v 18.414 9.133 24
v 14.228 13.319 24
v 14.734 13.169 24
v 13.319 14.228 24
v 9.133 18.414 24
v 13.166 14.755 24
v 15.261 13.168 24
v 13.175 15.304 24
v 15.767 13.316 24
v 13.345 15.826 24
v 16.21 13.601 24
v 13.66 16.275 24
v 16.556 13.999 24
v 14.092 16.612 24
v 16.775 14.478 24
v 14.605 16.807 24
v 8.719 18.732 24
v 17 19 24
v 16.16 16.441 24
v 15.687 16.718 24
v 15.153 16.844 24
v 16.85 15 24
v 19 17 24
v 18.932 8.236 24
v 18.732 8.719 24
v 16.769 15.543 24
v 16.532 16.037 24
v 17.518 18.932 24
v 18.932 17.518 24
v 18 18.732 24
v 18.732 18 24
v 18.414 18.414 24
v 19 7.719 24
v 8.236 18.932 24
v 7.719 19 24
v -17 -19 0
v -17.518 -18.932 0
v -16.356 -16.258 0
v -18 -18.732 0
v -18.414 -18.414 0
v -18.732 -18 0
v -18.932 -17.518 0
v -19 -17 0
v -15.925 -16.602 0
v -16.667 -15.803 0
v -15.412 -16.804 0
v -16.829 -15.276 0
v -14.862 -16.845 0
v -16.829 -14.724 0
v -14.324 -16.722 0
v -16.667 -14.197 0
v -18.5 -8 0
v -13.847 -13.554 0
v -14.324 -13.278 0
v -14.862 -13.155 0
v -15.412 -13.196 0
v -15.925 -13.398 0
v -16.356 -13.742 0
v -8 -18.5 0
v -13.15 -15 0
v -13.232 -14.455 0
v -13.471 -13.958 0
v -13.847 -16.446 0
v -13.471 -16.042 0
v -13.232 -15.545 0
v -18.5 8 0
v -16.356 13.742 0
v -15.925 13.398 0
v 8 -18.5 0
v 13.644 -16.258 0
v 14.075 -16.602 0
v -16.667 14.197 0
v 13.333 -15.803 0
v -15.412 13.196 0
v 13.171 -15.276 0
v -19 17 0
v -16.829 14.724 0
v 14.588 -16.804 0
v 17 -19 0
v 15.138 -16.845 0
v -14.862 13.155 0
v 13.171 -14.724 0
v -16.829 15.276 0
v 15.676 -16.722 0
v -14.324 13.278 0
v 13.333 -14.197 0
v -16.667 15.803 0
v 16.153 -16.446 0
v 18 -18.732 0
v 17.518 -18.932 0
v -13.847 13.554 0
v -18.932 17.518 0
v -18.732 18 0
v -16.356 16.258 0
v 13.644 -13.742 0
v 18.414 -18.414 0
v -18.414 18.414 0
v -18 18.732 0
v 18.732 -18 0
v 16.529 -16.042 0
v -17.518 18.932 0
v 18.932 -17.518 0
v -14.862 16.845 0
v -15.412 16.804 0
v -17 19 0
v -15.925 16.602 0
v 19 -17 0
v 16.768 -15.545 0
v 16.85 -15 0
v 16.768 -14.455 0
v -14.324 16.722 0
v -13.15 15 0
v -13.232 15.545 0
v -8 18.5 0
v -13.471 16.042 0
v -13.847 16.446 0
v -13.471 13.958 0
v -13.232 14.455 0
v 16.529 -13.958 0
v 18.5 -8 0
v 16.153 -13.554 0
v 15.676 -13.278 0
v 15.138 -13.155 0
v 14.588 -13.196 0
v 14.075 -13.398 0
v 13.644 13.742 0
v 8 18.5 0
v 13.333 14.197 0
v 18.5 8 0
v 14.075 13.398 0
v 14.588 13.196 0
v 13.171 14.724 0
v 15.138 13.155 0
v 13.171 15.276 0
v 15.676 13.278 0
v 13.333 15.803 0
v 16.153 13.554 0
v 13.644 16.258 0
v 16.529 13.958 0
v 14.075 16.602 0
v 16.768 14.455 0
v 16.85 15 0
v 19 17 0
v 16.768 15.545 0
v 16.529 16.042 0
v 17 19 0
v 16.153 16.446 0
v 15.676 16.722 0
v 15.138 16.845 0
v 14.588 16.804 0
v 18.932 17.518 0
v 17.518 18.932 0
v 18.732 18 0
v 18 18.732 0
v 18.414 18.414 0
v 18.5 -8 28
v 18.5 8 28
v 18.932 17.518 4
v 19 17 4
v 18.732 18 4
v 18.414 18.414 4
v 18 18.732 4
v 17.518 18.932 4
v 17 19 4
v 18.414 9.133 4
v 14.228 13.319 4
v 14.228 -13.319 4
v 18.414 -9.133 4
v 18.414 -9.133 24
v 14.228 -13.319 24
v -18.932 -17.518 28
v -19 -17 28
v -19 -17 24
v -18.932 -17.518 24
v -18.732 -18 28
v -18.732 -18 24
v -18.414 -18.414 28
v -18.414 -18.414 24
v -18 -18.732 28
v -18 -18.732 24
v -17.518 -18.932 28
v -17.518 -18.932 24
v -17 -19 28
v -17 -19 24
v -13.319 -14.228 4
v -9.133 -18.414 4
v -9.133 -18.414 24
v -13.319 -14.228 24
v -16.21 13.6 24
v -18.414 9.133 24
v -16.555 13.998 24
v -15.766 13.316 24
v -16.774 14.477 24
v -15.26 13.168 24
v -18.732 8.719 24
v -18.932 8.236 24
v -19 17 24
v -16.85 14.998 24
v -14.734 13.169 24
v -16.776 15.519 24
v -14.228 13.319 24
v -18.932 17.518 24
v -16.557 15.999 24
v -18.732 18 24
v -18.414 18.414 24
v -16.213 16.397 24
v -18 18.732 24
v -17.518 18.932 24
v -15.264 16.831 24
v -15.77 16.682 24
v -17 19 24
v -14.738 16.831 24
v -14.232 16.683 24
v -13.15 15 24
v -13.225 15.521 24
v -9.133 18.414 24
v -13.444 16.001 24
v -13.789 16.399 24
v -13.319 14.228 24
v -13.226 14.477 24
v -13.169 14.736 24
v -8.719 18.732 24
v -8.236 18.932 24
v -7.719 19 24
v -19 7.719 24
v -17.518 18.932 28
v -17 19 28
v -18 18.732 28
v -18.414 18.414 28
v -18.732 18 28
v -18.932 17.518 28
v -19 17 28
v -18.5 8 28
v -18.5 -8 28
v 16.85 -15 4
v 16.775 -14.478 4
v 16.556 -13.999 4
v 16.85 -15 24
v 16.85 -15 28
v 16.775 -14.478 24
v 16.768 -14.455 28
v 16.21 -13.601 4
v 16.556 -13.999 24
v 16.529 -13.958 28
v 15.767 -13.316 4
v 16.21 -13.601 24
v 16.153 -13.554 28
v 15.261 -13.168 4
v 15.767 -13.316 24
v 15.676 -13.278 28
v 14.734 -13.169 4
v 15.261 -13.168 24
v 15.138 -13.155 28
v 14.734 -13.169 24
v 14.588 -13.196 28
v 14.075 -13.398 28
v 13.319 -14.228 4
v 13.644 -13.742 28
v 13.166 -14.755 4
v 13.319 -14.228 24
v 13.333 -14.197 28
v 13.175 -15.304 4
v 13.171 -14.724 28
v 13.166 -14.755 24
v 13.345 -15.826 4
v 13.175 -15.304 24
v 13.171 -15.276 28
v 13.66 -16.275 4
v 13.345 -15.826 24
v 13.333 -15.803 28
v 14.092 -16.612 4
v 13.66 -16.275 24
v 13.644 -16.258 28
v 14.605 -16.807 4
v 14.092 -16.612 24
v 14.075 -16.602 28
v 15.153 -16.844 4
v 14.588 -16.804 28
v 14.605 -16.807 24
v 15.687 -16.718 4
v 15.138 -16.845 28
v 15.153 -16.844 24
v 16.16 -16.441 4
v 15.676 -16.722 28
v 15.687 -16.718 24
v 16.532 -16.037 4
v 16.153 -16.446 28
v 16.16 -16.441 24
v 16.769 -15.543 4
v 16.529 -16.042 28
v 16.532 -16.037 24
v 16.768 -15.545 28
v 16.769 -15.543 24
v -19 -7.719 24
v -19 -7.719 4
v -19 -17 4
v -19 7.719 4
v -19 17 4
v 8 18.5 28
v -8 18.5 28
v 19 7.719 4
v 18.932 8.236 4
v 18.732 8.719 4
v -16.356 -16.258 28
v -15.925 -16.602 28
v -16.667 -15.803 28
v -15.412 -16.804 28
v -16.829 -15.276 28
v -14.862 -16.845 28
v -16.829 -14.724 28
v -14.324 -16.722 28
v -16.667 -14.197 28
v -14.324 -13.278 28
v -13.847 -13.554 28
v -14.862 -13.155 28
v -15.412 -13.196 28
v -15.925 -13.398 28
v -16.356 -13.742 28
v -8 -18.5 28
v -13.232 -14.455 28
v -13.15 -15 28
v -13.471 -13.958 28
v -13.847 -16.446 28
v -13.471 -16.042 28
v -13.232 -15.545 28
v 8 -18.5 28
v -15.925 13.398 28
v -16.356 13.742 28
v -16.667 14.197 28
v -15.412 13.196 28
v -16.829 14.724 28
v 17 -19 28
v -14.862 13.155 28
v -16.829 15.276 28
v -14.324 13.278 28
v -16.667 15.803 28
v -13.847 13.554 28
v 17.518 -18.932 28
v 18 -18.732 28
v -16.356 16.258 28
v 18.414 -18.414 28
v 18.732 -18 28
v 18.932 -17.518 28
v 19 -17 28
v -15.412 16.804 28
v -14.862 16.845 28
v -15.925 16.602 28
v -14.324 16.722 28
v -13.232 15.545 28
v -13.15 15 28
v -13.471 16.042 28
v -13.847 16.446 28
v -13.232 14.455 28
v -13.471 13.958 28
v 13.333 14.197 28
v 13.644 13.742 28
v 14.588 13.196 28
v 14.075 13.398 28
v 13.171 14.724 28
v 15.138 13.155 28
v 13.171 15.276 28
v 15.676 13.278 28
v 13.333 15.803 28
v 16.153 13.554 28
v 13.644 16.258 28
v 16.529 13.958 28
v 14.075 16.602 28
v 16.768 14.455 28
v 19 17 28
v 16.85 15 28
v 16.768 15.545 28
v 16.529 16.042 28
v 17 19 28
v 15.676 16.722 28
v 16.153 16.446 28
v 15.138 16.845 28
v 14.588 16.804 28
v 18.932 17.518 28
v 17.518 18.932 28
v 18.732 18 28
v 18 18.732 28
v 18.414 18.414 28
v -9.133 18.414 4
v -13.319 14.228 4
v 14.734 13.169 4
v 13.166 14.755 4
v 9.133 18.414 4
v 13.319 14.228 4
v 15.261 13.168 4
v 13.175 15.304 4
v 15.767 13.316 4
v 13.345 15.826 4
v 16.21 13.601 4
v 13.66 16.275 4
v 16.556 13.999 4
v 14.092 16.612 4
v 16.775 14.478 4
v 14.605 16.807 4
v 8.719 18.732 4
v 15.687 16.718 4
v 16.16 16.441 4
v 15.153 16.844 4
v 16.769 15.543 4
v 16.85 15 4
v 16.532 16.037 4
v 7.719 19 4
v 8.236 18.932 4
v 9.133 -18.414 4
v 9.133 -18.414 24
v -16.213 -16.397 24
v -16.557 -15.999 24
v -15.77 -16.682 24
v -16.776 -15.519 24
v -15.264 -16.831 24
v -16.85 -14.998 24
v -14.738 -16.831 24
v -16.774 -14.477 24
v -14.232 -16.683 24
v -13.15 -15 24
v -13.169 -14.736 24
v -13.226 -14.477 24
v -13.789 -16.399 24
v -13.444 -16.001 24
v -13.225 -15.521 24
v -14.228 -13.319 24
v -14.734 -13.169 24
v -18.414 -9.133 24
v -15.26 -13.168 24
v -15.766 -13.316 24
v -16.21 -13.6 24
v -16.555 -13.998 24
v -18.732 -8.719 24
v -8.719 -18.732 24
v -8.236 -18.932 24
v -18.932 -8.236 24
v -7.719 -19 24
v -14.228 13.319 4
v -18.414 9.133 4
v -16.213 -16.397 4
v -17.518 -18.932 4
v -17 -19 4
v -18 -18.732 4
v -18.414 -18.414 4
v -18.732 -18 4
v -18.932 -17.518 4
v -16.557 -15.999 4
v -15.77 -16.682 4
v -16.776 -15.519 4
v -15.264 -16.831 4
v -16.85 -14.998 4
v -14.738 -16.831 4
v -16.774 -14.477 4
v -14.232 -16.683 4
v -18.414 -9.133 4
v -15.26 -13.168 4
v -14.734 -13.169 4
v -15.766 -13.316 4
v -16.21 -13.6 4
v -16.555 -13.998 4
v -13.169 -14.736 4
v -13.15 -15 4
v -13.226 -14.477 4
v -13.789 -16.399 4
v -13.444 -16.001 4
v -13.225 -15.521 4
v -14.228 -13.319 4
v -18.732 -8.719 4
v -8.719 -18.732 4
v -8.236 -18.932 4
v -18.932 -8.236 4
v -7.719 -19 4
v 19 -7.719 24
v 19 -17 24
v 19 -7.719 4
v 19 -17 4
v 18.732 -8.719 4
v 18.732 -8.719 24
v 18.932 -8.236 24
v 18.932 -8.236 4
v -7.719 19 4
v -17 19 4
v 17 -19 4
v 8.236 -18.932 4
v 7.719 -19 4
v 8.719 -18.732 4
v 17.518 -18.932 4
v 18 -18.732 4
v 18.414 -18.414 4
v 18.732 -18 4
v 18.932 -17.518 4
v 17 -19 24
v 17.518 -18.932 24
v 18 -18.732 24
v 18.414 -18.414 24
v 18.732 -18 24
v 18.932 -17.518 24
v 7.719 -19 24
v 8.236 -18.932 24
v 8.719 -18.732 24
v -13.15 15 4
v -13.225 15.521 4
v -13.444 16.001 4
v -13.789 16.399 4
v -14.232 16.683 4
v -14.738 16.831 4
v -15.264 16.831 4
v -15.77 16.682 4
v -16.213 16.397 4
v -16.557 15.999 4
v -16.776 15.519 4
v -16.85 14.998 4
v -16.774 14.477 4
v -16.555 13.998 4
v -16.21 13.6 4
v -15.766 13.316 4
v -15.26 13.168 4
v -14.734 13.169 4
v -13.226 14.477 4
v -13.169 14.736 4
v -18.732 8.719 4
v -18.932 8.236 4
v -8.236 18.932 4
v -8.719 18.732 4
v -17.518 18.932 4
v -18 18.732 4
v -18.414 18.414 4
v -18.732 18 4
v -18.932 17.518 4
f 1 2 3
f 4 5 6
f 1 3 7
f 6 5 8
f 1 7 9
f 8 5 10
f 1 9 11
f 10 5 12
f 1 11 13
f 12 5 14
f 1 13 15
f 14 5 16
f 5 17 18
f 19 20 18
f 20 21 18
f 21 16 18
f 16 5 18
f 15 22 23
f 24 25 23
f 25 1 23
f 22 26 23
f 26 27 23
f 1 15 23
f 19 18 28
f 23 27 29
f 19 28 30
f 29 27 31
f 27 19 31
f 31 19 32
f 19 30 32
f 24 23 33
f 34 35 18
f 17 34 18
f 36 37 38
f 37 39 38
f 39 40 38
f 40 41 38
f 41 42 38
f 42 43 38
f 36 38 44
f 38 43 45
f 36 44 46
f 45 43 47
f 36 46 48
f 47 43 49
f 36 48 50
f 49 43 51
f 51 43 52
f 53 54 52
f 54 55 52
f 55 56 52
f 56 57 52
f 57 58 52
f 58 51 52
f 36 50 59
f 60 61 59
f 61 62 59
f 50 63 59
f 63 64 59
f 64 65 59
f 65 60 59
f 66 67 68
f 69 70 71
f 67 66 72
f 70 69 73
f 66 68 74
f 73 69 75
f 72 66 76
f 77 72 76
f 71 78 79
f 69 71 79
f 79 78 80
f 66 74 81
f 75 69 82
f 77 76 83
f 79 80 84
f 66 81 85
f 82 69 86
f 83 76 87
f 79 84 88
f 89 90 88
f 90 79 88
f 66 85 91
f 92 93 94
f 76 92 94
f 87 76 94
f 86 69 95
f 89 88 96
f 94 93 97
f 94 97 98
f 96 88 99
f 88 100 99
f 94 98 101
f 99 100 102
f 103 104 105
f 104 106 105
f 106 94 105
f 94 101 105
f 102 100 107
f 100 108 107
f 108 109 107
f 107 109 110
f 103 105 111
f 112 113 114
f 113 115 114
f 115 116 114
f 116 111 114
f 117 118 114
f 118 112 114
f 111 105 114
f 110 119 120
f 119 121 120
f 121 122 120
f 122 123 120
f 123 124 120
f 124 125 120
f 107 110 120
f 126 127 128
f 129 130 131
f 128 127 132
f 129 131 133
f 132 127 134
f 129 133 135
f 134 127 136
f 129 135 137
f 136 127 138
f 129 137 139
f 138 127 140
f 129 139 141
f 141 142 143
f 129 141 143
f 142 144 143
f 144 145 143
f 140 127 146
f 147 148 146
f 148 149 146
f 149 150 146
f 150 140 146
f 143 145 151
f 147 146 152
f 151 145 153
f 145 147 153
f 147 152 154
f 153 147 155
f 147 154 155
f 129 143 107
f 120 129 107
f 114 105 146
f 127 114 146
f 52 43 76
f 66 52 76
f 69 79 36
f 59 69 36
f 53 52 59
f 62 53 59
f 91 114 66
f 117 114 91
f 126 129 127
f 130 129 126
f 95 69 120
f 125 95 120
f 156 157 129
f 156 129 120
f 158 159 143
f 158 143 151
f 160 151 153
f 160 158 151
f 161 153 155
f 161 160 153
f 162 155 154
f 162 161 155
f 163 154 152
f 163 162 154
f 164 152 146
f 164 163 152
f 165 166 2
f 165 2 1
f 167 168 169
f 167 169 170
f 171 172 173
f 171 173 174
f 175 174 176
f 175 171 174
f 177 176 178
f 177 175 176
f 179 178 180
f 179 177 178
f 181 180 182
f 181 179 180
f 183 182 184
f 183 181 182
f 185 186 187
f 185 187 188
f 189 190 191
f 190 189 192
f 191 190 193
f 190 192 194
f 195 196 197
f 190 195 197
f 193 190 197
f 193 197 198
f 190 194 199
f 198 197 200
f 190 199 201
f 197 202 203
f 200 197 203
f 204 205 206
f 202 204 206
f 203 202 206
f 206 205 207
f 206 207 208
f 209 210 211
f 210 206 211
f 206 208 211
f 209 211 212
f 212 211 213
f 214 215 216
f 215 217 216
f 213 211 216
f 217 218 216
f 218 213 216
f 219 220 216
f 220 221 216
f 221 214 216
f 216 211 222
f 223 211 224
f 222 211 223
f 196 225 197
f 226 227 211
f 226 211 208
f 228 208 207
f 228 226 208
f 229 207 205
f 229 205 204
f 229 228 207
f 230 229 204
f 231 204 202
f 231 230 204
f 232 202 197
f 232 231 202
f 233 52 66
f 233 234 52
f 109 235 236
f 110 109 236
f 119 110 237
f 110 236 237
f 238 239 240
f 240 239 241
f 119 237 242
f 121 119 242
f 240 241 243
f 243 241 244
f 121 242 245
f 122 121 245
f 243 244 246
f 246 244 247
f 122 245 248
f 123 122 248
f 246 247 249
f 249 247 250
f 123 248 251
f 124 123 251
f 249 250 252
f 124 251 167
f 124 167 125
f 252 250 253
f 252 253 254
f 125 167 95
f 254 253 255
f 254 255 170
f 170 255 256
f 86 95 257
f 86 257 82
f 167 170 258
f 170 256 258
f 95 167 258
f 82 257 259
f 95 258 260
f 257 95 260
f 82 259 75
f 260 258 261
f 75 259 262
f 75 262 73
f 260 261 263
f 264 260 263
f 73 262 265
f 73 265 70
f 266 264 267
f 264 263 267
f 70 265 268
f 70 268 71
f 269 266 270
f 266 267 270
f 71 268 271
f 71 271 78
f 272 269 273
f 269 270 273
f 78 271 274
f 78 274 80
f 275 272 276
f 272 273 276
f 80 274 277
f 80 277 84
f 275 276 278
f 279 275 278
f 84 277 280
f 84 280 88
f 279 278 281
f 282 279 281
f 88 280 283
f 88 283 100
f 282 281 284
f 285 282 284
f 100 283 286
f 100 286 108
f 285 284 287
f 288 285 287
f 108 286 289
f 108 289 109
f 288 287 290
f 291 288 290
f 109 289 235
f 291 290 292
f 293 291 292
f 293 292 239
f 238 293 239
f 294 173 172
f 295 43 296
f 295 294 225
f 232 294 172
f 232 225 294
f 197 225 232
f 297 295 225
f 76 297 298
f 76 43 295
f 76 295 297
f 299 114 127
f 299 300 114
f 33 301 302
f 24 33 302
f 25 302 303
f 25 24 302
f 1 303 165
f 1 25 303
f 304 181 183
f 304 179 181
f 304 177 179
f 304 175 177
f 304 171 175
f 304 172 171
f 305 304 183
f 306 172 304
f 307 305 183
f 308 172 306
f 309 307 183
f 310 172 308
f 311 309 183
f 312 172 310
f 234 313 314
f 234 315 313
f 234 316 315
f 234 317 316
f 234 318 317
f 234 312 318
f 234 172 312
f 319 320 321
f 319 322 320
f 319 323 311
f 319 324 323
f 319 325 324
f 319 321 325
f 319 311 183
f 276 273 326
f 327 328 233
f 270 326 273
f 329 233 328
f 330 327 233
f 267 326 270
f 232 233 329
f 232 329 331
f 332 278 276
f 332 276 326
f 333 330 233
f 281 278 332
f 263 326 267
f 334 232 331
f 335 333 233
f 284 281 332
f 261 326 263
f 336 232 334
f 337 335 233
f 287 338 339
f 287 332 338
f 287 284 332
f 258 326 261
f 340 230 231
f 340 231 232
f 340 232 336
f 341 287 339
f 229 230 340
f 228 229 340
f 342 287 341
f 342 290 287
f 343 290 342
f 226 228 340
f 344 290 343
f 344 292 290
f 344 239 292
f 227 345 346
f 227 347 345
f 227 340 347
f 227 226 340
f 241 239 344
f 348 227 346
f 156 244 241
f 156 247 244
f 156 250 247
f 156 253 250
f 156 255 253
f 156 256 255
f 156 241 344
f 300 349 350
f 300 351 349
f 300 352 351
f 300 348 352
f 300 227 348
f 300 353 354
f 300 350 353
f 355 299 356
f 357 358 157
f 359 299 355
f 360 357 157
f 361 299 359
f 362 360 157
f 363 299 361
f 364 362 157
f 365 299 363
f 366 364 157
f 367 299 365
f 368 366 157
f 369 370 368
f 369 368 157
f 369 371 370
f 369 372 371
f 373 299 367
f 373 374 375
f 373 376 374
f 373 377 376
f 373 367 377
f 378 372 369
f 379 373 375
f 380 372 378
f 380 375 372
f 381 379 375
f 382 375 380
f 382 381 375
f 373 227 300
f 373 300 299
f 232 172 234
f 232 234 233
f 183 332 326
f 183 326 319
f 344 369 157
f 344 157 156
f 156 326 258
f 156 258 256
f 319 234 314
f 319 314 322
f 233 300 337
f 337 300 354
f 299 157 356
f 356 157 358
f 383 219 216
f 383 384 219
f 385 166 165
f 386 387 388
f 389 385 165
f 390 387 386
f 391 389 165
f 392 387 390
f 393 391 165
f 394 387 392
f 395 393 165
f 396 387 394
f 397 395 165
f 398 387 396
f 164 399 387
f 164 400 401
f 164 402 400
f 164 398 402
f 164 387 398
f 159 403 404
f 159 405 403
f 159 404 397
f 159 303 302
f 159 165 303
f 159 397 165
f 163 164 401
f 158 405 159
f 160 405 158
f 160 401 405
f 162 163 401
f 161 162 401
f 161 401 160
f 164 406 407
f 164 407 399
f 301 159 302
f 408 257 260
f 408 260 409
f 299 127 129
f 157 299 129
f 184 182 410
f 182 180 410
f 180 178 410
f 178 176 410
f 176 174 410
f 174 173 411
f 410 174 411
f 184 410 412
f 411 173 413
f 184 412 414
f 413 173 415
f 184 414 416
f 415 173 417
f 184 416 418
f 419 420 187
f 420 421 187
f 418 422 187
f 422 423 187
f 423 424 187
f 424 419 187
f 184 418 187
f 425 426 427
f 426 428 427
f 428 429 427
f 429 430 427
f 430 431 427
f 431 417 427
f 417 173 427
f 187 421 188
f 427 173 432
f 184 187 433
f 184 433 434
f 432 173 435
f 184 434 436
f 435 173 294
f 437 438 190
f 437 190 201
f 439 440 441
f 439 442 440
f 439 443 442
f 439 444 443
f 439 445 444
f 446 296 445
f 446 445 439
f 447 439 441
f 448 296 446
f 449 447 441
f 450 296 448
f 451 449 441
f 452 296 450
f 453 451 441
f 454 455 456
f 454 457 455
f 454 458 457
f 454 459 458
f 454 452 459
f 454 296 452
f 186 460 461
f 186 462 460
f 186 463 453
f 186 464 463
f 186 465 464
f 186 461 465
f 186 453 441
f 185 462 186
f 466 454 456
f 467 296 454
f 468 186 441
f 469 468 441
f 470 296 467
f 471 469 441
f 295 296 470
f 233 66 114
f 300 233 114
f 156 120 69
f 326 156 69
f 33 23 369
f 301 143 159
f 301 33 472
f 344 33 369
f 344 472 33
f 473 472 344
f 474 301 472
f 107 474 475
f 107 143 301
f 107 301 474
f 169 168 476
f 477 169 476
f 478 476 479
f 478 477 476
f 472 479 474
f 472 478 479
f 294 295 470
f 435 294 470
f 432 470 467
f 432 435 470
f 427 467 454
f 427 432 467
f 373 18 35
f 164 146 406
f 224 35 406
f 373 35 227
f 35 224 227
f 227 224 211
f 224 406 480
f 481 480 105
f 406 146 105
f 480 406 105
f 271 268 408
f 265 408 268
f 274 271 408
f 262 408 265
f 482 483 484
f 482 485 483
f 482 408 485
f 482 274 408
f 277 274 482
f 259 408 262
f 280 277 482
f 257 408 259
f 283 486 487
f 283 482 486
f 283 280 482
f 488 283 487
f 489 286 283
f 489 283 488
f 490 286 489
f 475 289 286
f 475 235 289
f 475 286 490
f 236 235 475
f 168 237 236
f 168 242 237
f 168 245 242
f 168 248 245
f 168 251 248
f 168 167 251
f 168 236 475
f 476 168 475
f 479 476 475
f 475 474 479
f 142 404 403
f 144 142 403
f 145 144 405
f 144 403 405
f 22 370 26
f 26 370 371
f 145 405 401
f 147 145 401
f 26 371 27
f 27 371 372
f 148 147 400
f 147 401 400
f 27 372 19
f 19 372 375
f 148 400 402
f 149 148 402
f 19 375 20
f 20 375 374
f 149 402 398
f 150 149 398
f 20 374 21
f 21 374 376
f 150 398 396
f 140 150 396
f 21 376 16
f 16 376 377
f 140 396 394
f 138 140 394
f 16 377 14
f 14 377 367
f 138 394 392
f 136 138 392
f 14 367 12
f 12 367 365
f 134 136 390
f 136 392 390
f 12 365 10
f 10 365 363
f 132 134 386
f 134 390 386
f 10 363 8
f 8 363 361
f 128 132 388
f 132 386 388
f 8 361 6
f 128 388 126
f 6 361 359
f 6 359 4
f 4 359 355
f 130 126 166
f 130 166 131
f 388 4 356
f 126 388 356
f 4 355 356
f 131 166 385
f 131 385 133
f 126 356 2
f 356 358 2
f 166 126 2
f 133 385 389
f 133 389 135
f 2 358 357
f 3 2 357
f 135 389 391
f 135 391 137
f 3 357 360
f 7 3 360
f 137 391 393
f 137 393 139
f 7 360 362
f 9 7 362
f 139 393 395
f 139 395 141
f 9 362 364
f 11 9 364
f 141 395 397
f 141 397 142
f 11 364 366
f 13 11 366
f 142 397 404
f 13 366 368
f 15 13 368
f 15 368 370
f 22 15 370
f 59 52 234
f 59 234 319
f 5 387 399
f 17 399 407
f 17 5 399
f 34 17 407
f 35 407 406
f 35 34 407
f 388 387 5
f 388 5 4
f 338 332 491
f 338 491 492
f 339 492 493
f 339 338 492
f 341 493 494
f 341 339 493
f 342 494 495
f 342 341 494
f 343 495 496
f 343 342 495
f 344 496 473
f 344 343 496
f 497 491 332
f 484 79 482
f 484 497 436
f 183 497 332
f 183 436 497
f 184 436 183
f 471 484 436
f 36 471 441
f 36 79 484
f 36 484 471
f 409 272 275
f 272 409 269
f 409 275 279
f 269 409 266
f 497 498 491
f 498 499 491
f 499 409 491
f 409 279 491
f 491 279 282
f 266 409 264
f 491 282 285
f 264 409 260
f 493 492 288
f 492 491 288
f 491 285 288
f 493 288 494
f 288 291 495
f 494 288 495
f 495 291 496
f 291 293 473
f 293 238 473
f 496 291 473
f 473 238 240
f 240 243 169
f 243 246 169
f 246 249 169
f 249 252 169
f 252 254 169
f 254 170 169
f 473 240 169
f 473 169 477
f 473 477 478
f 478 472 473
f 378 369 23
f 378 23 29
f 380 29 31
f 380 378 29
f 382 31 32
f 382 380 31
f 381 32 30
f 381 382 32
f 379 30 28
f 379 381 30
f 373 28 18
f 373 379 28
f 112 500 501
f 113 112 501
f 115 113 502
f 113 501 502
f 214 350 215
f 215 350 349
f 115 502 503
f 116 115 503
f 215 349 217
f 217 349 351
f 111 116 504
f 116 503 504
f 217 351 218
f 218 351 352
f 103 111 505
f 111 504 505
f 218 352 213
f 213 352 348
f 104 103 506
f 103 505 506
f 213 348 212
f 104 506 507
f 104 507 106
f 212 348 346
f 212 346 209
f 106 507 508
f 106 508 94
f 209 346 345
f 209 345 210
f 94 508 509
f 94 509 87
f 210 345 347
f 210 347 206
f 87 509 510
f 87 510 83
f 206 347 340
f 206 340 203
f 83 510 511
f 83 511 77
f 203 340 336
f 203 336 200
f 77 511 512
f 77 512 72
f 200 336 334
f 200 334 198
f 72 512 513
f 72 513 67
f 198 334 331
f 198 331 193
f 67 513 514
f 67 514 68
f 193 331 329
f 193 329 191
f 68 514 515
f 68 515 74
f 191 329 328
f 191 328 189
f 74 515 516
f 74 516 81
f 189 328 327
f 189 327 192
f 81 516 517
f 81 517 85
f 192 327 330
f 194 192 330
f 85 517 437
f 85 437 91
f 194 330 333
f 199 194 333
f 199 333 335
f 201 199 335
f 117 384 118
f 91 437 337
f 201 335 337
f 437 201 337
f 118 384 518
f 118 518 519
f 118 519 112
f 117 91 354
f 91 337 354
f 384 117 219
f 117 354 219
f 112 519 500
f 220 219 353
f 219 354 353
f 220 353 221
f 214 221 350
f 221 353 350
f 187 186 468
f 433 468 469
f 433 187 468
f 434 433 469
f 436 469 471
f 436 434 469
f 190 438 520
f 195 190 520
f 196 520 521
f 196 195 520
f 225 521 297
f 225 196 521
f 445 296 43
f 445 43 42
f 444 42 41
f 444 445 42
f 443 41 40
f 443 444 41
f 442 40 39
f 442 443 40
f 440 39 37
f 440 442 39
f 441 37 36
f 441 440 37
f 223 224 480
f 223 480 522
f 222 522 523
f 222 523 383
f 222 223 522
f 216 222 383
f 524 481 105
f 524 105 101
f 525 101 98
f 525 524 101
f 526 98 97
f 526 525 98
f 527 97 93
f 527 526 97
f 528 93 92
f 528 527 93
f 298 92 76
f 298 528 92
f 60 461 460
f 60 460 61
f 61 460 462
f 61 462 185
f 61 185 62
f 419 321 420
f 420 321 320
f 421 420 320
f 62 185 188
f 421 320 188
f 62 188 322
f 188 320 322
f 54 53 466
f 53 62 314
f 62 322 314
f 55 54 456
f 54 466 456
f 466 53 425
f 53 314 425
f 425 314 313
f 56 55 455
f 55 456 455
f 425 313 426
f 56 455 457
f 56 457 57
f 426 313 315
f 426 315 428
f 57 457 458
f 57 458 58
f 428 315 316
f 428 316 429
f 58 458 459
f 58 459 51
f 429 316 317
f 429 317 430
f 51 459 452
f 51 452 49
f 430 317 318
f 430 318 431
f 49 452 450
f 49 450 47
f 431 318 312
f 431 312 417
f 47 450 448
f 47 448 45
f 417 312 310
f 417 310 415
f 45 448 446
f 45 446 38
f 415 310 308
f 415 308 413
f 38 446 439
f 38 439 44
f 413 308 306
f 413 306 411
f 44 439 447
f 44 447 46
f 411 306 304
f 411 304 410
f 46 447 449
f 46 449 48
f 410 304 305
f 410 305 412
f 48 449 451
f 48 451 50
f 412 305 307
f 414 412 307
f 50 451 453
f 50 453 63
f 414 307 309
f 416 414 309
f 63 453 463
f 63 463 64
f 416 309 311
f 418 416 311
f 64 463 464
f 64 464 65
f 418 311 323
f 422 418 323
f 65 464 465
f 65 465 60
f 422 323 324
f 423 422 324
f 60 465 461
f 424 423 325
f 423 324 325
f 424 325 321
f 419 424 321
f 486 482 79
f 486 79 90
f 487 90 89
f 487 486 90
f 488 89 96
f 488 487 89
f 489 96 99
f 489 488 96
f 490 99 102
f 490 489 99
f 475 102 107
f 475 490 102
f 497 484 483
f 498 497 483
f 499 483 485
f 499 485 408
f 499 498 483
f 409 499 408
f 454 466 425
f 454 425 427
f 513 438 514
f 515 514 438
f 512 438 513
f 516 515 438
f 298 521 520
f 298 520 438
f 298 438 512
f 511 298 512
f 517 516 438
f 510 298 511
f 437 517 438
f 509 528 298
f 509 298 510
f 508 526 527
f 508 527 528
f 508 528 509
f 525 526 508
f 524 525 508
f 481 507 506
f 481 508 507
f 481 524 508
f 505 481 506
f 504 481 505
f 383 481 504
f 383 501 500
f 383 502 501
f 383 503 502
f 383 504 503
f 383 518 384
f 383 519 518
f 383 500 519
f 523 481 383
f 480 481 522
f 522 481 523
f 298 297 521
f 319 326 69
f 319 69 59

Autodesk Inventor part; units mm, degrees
ref_plane "YZ Plane" through (0, 0, 0) normal (1, 0, 0) x (0, 1, 0)
ref_plane "XZ Plane" through (0, 0, 0) normal (0, 1, 0) x (-1, 0, 0)
ref_plane "XY Plane" through (0, 0, 0) normal (0, 0, 1) x (1, 0, 0)
sketch "Sketch1" plane through (0, 0, 0) normal (0, 0, 1) x (1, 0, 0)
  line L0 (19, -19) -> (-19, -19)
  line L1 (-19, -19) -> (-19, 19)
  line L2 (-19, 19) -> (19, 19)
  line L3 (19, 19) -> (19, -19)
  line L4 (19, -19) -> (-19, 19) construction
  line L5 (-19, -19) -> (19, 19) construction
  point P0 (0, 0)
  dimension "d0" = 38
  dimension "d1" = 38
extrude "Extrusion1" add sketch "Sketch1" along normal blind 4
sketch "Sketch2" plane through (0, 0, 4) normal (0, 0, 1) x (1, 0, 0)
  line L0 (19, 19) -> (-19, 19) projected
  line L1 (-19, 19) -> (-19, -19) projected
  line L2 (8.547, -19) -> (-8.547, -19)
  line L3 (-19, -8.547) -> (-19, 8.547)
  line L4 (-8.547, 19) -> (8.547, 19)
  line L5 (19, 8.547) -> (19, -8.547)
  line L6 (19, -19) -> (-19, 19) construction
  line L7 (-19, -19) -> (19, 19) construction
  line L8 (19, 6.0309) -> (19, -12.9361)
  line L9 (-19, 8.547) -> (-8.547, 19)
  line L10 (8.547, 19) -> (19, 8.547)
  line L11 (19, -8.547) -> (8.547, -19)
  line L12 (-8.547, -19) -> (-19, -8.547)
  point P0 (0, 0)
  dimension "d16" = 38
  dimension "d17" = 38
  dimension "d18" = 10.453
  dimension "d19" = 10.453
  dimension "d20" = 10.453
  dimension "d21" = 10.453
  dimension "d22" = 10.453
  dimension "d23" = 10.453
  dimension "d24" = 10.453
  dimension "d25" = 10.453
extrude "Extrusion2" add sketch "Sketch2" along normal blind 20 contours L10 L5 L11 L2 L12 L1 L9 L0
sketch "Sketch3" plane through (0, 0, 24) normal (0, 0, 1) x (1, 0, 0)
  line L0 (19, 19) -> (-19, 19) projected
  line L1 (19, -19) -> (-19, -19)
  line L2 (-19, -19) -> (-19, 19)
  line L3 (-19, 19) -> (19, 19)
  line L4 (19, 19) -> (19, -19)
  line L5 (19, -19) -> (-19, 19) construction
  line L6 (-19, -19) -> (19, 19) construction
  point P0 (0, 0)
extrude "Extrusion3" add sketch "Sketch3" along normal blind 4
sketch "Sketch5" plane through (0, 0, 28) normal (0, 0, 1) x (1, 0, 0)
  line L0 (8, -18.5) -> (-8, -18.5)
  line L1 (-18.5, -8) -> (-18.5, 8)
  line L2 (-8, 18.5) -> (8, 18.5)
  line L3 (18.5, 8) -> (18.5, -8)
  line L4 (18.5, -18.5) -> (-18.5, 18.5) construction
  line L5 (-18.5, -18.5) -> (18.5, 18.5) construction
  line L6 (-18.5, 8) -> (-8, 18.5)
  line L7 (8, 18.5) -> (18.5, 8)
  line L8 (18.5, -8) -> (8, -18.5)
  line L9 (-18.5, -8) -> (-8, -18.5)
  point P0 (0, 0)
  dimension "d27" = 37
  dimension "d28" = 37
  dimension "d29" = 10.5
  dimension "d30" = 10.5
  dimension "d31" = 10.5
  dimension "d32" = 10.5
  dimension "d33" = 10.5
  dimension "d34" = 10.5
  dimension "d35" = 10.5
  dimension "d36" = 10.5
extrude "Extrusion5" cut sketch "Sketch5" against normal blind 28
fillet "Fillet2" radius 2 16 edges at (19, 19, 26) (19, 19, 2) (-19, 19, 26) (-19, 19, 2) (-19, -19, 26) (-19, -19, 2) (19, -19, 26) (19, -19, 2) (19, -8.547, 14) (8.547, -19, 14) (-8.547, -19, 14) (-19, -8.547, 14) (-19, 8.547, 14) (-8.547, 19, 14) (8.547, 19, 14) (19, 8.547, 14)
sketch "Sketch6" plane through (0, 0, 28) normal (0, 0, 1) x (1, 0, 0)
  line L0 (-15, -15) -> (15, -15) construction
  line L1 (15, -15) -> (15, 15) construction
  line L2 (15, 15) -> (-15, 15) construction
  line L3 (-15, 15) -> (-15, -15) construction
  line L4 (-15, -15) -> (15, 15) construction
  line L5 (15, -15) -> (-15, 15) construction
  circle A0 centre (15, 15) radius 1.85
  circle A1 centre (15, -15) radius 1.85
  circle A2 centre (-15, -15) radius 1.85
  circle A3 centre (-15, 15) radius 1.85
  point P0 (0, 0)
  dimension "d40" = 30
  dimension "d41" = 30
  dimension "d42" = 3.7
  dimension "d43" = 3.7
  dimension "d44" = 3.7
  dimension "d45" = 3.7
extrude "Extrusion6" cut sketch "Sketch6" against normal blind 28
equation "\"d19\" = d18"
equation "\"d20\" = d18"
equation "\"d21\" = d20"
equation "\"d22\" = d18"
equation "\"d23\" = d22"
equation "\"d24\" = d18"
equation "\"d25\" = d24"
equation "\"d30\" = d29"
equation "\"d31\" = d29"
equation "\"d32\" = d31"
equation "\"d33\" = d29"
equation "\"d34\" = d33"
equation "\"d35\" = d29"
equation "\"d36\" = d35"
properties part number "fan"
